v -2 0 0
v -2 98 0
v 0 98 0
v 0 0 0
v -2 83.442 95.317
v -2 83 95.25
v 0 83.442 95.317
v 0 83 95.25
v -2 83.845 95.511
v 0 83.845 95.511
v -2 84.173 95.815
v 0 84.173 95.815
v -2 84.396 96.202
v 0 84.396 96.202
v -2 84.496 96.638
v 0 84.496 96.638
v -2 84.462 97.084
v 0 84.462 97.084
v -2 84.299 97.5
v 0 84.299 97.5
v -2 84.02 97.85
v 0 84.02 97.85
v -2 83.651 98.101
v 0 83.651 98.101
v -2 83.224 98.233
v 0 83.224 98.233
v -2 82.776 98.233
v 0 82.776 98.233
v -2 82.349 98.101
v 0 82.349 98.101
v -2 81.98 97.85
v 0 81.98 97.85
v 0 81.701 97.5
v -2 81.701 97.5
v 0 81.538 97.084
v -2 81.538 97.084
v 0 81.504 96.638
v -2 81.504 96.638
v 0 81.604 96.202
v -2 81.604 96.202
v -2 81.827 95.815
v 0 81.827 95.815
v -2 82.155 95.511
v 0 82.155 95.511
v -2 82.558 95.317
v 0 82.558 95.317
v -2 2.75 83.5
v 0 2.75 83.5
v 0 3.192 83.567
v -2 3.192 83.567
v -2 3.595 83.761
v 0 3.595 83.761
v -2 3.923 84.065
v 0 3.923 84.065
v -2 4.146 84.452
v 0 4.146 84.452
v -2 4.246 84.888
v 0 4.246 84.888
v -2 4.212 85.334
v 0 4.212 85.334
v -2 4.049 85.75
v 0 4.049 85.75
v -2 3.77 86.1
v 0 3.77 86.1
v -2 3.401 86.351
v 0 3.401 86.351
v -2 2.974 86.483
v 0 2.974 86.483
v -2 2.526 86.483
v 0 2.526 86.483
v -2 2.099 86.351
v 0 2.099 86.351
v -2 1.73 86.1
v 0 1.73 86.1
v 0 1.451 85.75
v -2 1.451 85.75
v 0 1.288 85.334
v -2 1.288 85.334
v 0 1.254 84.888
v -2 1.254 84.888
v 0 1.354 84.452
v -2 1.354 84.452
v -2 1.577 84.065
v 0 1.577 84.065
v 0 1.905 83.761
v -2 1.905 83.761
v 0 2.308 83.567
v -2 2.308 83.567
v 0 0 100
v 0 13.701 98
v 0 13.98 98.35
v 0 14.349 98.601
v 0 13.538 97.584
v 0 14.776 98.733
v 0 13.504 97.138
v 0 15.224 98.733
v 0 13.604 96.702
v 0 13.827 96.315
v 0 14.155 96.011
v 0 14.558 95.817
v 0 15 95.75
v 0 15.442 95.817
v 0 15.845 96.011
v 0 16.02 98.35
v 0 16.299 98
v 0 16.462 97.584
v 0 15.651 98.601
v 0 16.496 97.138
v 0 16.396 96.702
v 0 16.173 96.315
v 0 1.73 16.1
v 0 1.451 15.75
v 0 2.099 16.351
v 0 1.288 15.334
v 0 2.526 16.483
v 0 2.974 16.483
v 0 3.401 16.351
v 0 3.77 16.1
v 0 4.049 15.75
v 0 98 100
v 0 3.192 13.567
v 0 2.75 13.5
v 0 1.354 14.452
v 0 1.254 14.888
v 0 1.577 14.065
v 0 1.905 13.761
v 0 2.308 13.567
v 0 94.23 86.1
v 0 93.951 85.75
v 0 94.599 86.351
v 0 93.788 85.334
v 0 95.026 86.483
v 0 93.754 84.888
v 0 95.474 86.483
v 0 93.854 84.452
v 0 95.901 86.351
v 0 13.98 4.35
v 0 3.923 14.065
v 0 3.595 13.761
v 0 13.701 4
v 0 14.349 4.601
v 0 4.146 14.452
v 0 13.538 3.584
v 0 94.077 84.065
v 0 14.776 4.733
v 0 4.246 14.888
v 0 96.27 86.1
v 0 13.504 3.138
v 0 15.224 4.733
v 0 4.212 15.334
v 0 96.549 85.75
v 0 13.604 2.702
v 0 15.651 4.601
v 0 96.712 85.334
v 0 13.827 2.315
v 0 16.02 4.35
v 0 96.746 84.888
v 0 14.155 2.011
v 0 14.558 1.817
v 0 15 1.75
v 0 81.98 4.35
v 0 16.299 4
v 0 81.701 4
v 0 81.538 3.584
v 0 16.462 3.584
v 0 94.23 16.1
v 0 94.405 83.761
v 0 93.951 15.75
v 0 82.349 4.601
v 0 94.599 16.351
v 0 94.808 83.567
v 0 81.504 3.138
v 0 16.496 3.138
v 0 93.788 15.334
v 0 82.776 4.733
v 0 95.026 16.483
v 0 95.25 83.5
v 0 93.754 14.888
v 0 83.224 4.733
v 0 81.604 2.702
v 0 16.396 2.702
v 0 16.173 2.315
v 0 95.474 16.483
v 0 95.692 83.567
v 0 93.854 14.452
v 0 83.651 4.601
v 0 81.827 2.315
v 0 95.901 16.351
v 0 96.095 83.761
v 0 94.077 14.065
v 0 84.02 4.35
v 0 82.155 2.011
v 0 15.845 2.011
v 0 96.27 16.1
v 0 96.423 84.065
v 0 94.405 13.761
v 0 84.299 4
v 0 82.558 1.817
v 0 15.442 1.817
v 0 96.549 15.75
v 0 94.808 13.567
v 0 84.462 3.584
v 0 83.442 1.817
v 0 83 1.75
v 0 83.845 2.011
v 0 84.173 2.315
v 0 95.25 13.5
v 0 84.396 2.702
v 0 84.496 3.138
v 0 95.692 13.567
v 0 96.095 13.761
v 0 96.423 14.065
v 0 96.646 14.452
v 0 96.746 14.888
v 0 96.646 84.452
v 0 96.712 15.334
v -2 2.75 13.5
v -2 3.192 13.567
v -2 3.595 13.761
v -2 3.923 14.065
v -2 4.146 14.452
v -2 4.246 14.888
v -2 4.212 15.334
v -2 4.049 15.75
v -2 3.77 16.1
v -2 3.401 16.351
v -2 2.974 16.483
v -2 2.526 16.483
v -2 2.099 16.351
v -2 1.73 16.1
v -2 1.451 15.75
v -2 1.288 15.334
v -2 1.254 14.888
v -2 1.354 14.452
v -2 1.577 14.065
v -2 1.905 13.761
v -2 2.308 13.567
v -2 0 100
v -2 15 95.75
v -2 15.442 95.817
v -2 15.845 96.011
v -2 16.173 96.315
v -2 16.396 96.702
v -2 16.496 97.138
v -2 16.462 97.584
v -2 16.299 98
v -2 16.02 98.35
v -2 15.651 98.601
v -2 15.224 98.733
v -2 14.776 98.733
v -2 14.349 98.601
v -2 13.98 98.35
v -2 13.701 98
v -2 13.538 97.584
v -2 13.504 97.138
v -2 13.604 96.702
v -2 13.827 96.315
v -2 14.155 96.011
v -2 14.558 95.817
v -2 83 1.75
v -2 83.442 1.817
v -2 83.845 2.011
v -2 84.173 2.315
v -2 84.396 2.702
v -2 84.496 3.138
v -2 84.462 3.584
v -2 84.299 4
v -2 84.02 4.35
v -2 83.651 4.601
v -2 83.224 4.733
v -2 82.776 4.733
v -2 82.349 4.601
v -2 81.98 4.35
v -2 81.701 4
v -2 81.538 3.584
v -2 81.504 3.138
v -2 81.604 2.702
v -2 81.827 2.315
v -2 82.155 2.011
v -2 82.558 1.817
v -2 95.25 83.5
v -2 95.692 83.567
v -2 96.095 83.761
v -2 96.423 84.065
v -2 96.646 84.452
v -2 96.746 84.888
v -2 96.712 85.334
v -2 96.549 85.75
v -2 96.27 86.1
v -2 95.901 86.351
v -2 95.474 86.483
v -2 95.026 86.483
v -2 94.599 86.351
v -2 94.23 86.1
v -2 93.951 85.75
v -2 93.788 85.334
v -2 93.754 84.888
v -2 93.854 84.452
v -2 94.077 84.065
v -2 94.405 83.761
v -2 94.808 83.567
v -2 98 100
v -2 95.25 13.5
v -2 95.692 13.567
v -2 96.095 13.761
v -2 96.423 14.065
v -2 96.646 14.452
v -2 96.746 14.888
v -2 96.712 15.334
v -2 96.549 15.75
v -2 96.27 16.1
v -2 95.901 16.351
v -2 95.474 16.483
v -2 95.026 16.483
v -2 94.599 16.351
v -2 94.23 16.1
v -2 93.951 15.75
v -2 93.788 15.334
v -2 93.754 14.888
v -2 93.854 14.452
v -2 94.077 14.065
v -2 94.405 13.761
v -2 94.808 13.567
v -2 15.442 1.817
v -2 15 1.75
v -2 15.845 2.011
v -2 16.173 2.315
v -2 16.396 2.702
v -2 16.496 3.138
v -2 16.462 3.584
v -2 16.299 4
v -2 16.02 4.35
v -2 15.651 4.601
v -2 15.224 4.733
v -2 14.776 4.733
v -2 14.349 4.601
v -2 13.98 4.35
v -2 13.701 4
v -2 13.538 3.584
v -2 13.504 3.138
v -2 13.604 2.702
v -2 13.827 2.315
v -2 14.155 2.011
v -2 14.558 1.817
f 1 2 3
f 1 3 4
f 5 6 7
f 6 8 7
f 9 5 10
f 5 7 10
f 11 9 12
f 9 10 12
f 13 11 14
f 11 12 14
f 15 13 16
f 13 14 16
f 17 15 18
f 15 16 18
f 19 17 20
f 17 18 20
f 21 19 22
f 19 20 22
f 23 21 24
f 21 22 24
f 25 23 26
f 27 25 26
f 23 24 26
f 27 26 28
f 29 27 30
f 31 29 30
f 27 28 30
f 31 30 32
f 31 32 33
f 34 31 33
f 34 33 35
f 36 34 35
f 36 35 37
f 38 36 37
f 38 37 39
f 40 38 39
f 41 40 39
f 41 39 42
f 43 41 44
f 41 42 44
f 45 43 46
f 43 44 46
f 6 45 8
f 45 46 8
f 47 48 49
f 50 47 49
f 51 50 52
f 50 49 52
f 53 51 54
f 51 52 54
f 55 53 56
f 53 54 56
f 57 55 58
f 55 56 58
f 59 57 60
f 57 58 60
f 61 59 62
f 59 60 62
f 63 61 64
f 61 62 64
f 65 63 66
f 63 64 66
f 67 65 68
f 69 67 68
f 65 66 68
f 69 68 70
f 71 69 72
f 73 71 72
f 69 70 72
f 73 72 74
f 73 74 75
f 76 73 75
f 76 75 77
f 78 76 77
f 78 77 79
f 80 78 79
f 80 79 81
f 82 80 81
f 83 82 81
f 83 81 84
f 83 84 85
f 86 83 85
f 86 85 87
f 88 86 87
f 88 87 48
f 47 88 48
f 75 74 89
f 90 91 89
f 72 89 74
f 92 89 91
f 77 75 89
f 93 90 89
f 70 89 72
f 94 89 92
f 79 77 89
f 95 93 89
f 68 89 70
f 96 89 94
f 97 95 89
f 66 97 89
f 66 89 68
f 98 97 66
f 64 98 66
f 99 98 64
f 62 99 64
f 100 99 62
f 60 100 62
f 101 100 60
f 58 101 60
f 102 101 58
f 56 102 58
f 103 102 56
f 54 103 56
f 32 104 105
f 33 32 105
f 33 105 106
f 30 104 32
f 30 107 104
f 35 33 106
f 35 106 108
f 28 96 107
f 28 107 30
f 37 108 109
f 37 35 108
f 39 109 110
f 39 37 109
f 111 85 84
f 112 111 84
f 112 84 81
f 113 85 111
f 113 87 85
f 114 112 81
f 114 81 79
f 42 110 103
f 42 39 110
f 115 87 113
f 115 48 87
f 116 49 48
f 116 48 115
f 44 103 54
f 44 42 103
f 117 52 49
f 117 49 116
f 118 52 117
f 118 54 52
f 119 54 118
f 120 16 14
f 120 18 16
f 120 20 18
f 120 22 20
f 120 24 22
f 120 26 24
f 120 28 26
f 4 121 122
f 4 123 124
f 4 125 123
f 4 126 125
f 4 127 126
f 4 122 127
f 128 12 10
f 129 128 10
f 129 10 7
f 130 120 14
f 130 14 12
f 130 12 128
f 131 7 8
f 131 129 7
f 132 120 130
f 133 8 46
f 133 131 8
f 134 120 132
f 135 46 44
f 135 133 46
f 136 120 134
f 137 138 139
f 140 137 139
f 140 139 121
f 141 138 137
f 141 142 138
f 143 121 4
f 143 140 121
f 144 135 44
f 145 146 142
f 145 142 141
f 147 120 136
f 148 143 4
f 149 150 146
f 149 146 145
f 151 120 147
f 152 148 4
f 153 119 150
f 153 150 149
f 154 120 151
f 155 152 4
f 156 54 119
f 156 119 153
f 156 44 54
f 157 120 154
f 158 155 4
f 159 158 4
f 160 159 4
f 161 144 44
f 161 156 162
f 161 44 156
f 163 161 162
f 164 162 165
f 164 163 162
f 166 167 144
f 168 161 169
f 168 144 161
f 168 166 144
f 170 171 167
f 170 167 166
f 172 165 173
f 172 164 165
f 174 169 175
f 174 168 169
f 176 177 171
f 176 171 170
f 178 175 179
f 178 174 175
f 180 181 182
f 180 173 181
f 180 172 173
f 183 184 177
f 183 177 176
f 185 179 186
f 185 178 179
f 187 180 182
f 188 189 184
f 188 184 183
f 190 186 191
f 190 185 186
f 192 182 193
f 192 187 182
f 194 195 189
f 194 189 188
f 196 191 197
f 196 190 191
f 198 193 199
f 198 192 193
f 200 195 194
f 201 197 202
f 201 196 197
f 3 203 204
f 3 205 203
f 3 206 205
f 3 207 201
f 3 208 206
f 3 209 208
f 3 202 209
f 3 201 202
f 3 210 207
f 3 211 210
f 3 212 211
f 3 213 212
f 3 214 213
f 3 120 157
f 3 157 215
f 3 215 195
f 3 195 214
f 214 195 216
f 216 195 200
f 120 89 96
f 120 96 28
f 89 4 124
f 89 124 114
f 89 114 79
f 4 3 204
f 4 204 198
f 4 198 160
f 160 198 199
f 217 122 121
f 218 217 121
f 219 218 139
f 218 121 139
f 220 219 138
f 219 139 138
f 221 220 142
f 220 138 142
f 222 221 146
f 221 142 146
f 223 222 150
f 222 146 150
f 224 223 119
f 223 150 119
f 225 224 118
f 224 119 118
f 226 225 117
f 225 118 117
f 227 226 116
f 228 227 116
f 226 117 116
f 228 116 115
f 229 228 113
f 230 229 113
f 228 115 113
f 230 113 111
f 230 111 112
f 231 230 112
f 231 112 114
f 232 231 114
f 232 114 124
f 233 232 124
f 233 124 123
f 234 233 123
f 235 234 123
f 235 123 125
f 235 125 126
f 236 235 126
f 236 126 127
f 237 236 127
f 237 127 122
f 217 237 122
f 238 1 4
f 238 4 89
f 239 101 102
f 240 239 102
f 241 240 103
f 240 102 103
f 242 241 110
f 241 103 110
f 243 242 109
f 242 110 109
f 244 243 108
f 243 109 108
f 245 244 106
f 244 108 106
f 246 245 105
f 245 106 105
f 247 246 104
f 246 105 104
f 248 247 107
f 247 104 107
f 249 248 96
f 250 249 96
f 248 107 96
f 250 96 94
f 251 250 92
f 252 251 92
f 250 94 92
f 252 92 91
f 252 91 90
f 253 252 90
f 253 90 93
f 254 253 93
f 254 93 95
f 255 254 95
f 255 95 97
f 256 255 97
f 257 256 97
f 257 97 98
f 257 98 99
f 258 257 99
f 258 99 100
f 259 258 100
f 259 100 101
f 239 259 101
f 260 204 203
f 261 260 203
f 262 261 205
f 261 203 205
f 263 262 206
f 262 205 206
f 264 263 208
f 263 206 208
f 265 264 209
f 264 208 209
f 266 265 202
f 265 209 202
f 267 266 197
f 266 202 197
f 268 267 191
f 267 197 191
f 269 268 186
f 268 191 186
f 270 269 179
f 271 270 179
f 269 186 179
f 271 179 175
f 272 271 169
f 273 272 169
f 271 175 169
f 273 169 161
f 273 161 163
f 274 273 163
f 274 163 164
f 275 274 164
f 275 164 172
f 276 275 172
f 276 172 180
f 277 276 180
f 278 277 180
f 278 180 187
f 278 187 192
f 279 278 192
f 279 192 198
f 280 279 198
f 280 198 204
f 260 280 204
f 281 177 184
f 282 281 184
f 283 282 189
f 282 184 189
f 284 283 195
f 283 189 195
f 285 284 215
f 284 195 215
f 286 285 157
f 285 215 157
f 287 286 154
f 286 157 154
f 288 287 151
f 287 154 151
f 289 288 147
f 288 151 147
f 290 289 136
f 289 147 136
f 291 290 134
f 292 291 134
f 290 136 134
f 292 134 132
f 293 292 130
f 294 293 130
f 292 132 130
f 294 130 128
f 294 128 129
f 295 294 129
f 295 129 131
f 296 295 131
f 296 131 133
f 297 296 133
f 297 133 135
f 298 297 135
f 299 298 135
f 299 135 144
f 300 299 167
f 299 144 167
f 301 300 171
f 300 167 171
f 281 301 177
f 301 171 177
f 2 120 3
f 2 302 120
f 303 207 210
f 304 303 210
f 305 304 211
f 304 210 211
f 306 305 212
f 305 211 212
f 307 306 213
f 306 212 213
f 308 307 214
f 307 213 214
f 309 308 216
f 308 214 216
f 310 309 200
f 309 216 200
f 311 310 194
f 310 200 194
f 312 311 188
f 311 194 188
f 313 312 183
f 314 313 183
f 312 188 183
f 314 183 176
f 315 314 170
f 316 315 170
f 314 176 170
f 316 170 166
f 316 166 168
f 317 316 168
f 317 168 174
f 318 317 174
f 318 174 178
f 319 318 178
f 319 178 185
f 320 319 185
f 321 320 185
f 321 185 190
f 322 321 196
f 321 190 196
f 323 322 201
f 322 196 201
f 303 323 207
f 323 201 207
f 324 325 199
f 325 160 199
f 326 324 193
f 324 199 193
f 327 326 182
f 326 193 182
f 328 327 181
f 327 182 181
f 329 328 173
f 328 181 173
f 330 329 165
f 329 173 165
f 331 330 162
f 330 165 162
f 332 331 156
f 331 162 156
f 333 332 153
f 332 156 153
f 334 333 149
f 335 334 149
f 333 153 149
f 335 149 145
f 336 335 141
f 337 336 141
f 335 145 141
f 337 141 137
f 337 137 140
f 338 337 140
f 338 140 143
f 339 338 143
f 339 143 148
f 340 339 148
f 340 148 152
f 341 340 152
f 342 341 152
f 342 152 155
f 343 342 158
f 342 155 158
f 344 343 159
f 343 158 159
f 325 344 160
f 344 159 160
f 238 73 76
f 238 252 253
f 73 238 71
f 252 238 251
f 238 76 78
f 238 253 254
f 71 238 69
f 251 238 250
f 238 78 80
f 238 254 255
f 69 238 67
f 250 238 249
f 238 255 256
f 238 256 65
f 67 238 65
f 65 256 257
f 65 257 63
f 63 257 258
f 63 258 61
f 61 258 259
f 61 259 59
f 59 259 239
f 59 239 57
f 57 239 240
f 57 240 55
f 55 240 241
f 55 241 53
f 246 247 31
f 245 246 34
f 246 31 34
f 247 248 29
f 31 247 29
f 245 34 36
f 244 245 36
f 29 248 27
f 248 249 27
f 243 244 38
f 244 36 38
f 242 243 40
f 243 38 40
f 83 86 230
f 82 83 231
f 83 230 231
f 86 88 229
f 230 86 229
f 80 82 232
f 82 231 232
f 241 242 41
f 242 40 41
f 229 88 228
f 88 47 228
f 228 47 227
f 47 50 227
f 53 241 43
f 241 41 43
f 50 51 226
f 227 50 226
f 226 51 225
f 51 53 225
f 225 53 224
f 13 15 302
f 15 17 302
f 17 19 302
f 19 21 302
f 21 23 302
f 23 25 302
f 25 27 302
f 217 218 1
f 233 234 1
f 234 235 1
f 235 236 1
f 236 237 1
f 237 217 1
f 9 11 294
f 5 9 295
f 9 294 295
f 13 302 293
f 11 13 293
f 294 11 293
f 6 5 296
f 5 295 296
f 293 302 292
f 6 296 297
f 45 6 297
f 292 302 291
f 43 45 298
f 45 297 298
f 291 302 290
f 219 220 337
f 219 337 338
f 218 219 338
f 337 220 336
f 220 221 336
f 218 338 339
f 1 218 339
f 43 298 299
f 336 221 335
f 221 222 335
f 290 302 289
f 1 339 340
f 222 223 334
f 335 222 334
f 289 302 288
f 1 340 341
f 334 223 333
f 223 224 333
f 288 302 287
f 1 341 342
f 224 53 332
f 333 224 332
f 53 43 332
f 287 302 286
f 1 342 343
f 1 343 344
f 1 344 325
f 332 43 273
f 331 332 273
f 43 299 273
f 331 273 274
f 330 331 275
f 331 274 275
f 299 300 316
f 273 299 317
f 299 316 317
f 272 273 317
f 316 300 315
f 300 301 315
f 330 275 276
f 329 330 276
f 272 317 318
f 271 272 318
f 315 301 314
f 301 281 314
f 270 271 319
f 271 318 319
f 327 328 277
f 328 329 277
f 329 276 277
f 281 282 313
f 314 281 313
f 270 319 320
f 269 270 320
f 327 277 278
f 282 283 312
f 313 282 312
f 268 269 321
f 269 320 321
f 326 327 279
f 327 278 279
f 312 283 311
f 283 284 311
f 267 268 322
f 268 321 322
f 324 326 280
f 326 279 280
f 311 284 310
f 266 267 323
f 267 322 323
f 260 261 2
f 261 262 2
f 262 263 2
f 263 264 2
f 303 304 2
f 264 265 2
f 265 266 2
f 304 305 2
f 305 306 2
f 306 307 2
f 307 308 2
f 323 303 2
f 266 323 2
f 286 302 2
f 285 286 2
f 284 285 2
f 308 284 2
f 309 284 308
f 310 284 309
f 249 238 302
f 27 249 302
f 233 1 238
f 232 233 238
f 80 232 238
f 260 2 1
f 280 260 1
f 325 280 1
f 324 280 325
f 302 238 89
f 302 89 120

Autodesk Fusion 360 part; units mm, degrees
sketch "Sketch1" plane through (0, 0, 0) normal (1, 0, 0) x (0, 0, -1)
  line L0 (0, 0) -> (-100, 0)
  line L1 (-100, 0) -> (-100, 98)
  line L2 (-100, 98) -> (0, 98)
  line L3 (0, 98) -> (0, 0)
  dimension "d1" = 100
  dimension "d2" = 98
extrude "Extrude1" add sketch "Sketch1" against normal blind 2
extrude "Extrude2" add 1 faces at (0, 32.6667, 33.3333) along direction (1, 0, 0) blind 2
extrude "Extrude3" add 1 faces at (2, 32.6667, 33.3333) along direction (1, 0, 0) blind 1
sketch "Sketch2" plane through (3, 0, 0) normal (1, 0, 0) x (0, 0, -1)
  line L0 (-100, 98) -> (0, 98)
  line L1 (0, 98) -> (0, 0)
  line L2 (0, 0) -> (-100, 0)
  line L3 (-100, 0) -> (-100, 98)
  line L4 (-100, 98) -> (-85, 98)
  line L5 (-85, 98) -> (-85, 92.5)
  line L6 (-85, 92.5) -> (-100, 92.5)
  line L7 (-100, 92.5) -> (-100, 98)
  line L8 (-100, 98) -> (-93.5, 98)
  line L9 (-93.5, 98) -> (-93.5, 83)
  line L10 (0, 98) -> (-6.5, 98)
  line L11 (-6.5, 98) -> (-6.5, 83)
  line L12 (-6.5, 83) -> (0, 83)
  line L13 (0, 83) -> (0, 98)
  line L14 (0, 98) -> (-15, 98)
  line L15 (-15, 98) -> (-15, 92.5)
  line L16 (-15, 92.5) -> (0, 92.5)
  line L17 (0, 92.5) -> (0, 98)
  line L18 (0, 0) -> (-6.5, 0)
  line L19 (-6.5, 0) -> (-6.5, 15)
  line L20 (-6.5, 15) -> (0, 15)
  line L21 (0, 15) -> (0, 0)
  line L22 (0, 0) -> (-15, 0)
  line L23 (-15, 0) -> (-15, 5.5)
  line L24 (-15, 5.5) -> (0, 5.5)
  line L25 (0, 5.5) -> (0, 0)
  line L26 (-100, 0) -> (-85, 0)
  line L27 (-85, 0) -> (-85, 5.5)
  line L28 (-85, 5.5) -> (-100, 5.5)
  line L29 (-100, 5.5) -> (-100, 0)
  line L30 (-100, 0) -> (-94.5, 0)
  line L31 (-94.5, 0) -> (-94.5, 15)
  line L32 (-94.5, 15) -> (-100, 15)
  line L33 (-100, 15) -> (-100, 0)
  circle A0 centre (-85, 95.25) radius 1.5
  circle A1 centre (-97.25, 15) radius 1.5
  circle A2 centre (-85, 2.75) radius 1.5
  circle A3 centre (-15, 2.75) radius 1.5
  circle A4 centre (-3.25, 15) radius 1.5
  circle A5 centre (-3.25, 83) radius 1.5
  circle A6 centre (-15, 95.25) radius 1.5
  line L34 (-93.5, 83) -> (-100, 83)
  line L35 (-100, 83) -> (-100, 98)
  line L36 (-100, 98) -> (-93.5, 98)
  line L37 (-93.5, 98) -> (-93.5, 83)
  circle A7 centre (-96.75, 83) radius 1.5
  dimension "d53" = 15
  dimension "d54" = 5.5
  dimension "d55" = 6.5
  dimension "d57" = 6.5
  dimension "d58" = 15
  dimension "d59" = 15
  dimension "d60" = 5.5
  dimension "d61" = 6.5
  dimension "d62" = 15
  dimension "d63" = 5.5
  dimension "d64" = 15
  dimension "d65" = 5.5
  dimension "d66" = 15
  dimension "d67" = 100
  dimension "d68" = 98
  dimension "d69" = 5.5
  dimension "d70" = 15
  dimension "d71" = 3
  dimension "d73" = 3
  dimension "d74" = 3
  dimension "d75" = 3
  dimension "d76" = 3
  dimension "d77" = 3
  dimension "d78" = 3
  dimension "d81" = 15
  dimension "d83" = 3
extrude "Extrude9" cut sketch "Sketch2" against normal blind 20 contours L5 A0 | L5 A0 | L34 A7 | L34 A7 | L15 A6 | L15 A6 | L32 A1 | L32 A1 | L12 A5 | L12 A5 | L27 A2 | L27 A2 | L20 A4 | L20 A4 | L23 A3 | L23 A3
extrude "Extrude10" cut sketch "Sketch2" against normal blind 3 contours L0 L3 L4 L6 L7 L8 L9 L35 L36 L37 | L0 L4 L5 L6 L9 A0 L37 | L3 L6 L9 L34 L35 L37 A7 | L0 L1 L2 L3 L5 L6 L9 L11 L12 L15 L16 L19 L20 L23 L24 L27 L28 L31 L32 A0 A1 A2 A3 A4 A5 A6 L34 L37 A7 | L0 L11 L14 L15 L16 A6 | L3 L28 L31 L32 L33 A1 | L0 L1 L10 L11 L13 L14 L16 L17 | L2 L3 L26 L28 L29 L30 L31 L33 | L1 L11 L12 L13 L16 A5 | L2 L26 L27 L28 L31 A2 | L1 L19 L20 L21 L24 A4 | L2 L19 L22 L23 L24 A3 | L1 L2 L18 L19 L21 L22 L24 L25
